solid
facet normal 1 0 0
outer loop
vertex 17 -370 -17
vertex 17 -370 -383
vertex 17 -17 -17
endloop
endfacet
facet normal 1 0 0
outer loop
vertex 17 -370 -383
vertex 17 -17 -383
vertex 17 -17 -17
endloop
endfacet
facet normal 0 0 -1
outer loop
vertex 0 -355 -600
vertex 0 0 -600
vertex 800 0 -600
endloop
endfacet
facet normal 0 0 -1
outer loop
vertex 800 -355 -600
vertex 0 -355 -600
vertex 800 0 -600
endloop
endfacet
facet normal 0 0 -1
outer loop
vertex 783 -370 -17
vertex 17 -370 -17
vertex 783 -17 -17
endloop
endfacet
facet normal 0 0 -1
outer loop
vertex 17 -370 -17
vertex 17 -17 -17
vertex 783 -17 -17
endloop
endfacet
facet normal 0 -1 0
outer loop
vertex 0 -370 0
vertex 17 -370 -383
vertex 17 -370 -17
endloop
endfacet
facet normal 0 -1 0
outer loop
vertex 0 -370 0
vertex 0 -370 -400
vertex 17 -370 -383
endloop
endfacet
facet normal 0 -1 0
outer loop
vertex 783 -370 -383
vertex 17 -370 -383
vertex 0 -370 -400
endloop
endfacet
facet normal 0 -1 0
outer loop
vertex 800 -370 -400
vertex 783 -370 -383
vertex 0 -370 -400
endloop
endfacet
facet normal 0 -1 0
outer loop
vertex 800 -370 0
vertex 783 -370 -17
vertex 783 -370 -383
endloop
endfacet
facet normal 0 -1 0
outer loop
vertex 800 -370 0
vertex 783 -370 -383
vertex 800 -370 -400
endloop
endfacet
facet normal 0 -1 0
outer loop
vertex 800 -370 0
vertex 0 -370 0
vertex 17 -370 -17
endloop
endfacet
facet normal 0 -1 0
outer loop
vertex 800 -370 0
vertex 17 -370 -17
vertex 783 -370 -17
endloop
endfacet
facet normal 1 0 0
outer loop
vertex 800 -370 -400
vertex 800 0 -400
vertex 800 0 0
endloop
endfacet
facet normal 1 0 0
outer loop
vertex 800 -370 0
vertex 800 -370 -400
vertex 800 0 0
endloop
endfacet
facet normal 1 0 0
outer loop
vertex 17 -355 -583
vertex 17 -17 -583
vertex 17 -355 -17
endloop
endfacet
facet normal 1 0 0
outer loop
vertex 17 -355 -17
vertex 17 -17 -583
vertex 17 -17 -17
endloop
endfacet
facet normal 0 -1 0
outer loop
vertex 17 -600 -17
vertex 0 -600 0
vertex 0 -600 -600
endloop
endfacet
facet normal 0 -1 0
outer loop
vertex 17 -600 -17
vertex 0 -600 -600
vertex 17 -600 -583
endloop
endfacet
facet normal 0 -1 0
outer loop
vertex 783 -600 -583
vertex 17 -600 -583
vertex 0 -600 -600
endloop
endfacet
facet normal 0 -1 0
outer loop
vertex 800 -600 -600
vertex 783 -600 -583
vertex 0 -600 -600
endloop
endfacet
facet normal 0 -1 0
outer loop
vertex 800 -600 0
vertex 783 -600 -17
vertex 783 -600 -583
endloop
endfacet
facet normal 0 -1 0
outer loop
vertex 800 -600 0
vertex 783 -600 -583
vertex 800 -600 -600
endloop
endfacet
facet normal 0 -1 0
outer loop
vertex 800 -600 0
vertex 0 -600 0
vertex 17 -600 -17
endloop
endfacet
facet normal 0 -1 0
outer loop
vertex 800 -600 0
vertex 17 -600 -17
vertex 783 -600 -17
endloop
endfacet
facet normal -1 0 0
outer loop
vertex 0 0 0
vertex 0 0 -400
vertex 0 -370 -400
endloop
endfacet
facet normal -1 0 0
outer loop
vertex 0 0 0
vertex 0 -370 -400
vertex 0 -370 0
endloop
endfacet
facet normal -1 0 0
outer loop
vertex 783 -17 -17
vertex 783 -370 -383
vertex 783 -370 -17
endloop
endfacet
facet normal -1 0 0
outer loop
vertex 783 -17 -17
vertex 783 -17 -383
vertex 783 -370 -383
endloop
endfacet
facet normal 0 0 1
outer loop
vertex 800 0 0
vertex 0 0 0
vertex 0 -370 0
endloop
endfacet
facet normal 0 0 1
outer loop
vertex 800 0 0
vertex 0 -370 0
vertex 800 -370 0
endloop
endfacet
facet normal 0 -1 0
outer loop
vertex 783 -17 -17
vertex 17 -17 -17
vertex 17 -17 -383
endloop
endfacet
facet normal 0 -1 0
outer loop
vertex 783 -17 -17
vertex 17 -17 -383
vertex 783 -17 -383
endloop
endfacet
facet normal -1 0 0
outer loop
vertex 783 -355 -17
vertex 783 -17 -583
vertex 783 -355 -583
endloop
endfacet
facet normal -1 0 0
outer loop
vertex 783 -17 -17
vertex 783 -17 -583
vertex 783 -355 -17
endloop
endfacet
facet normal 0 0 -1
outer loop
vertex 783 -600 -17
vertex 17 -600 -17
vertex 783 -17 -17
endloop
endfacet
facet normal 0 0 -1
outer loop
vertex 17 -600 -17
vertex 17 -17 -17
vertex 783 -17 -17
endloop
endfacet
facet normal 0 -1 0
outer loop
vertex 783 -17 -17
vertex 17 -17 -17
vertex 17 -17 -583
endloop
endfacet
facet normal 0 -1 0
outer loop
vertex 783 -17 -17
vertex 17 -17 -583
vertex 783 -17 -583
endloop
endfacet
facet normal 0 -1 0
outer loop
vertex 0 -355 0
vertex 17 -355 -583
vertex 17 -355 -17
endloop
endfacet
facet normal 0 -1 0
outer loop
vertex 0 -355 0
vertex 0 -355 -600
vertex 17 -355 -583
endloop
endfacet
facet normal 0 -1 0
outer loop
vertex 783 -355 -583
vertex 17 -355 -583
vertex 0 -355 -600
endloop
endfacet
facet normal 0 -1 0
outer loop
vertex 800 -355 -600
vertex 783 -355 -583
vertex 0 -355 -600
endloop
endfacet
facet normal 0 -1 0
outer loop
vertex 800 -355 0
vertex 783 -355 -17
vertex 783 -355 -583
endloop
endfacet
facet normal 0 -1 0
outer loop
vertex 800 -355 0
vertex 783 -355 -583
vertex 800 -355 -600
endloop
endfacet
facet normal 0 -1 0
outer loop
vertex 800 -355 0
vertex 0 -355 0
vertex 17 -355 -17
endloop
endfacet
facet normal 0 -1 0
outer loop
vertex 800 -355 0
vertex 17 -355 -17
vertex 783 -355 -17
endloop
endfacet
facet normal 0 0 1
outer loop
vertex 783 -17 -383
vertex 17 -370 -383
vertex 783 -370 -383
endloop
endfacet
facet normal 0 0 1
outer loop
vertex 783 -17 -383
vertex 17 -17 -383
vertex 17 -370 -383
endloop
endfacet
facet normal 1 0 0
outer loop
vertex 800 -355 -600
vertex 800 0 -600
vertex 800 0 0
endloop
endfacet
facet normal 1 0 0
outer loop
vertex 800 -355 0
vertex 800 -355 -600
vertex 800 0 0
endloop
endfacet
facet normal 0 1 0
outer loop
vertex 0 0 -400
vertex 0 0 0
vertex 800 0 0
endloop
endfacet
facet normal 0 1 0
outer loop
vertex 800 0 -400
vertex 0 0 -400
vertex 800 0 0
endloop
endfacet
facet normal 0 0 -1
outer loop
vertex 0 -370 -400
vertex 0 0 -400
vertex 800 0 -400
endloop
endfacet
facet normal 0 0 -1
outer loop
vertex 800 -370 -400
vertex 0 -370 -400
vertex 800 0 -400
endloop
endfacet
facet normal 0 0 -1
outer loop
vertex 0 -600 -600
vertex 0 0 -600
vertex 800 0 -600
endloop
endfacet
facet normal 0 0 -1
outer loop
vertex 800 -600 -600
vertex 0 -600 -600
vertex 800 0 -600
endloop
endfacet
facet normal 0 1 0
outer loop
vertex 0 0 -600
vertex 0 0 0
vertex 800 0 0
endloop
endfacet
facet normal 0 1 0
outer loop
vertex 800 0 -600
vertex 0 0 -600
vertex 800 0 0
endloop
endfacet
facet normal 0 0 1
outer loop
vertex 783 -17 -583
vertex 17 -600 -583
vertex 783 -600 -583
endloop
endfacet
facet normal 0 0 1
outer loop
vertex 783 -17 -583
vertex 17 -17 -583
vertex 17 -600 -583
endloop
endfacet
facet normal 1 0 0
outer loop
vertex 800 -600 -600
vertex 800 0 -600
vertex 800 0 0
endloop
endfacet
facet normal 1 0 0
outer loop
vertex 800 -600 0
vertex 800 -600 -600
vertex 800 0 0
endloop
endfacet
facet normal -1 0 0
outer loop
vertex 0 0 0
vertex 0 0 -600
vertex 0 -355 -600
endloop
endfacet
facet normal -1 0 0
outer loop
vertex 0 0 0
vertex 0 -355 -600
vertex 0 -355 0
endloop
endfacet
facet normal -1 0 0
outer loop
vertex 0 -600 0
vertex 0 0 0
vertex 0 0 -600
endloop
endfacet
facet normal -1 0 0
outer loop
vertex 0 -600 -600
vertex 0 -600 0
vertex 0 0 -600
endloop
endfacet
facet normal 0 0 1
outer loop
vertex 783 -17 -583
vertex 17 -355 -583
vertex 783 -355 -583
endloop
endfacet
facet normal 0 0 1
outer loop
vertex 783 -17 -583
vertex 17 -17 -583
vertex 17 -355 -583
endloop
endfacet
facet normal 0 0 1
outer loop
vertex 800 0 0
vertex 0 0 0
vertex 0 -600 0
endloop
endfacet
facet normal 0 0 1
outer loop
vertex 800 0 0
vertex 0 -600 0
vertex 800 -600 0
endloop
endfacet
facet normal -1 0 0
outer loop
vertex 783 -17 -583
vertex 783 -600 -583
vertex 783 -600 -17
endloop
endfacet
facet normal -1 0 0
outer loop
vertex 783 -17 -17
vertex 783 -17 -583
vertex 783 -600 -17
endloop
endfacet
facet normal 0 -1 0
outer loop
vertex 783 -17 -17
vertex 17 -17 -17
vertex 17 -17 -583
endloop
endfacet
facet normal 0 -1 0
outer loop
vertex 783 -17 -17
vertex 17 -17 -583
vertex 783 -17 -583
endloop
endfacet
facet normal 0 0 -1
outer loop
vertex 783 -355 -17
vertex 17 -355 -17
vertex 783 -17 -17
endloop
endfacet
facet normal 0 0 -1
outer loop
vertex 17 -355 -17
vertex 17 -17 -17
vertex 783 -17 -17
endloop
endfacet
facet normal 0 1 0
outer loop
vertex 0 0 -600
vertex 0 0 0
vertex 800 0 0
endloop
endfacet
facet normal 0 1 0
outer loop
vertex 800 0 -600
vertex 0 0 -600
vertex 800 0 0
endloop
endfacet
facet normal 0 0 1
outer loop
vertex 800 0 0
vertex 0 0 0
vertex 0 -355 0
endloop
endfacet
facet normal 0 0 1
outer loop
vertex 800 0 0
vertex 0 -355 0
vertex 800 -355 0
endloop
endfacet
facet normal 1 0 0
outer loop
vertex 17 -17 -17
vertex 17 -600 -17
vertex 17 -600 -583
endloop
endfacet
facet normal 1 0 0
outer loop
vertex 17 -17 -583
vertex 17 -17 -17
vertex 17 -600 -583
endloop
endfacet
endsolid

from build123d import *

# Parameters (mm, degrees)
F0_W     = 800
F0_H     = 600
F1_DEPTH = 355
F2_T     = -17
F3_W     = 800
F3_H     = 400
F4_DEPTH = 370
F5_T     = -17
F3_H_2   = 200
F6_DEPTH = 600
F7_T     = -17


with BuildPart() as f1:
    # F0 (on Front) → F1 (new body)
    with BuildSketch(Plane.XZ):
        with Locations((400, -300)):
            Rectangle(F0_W, F0_H)
    extrude(amount=F1_DEPTH)

    # F2
    f2_openings = [f1.faces().sort_by_distance(p)[0] for p in [
        (400, -355, -300),
    ]]
    offset(amount=F2_T, openings=f2_openings)


with BuildPart() as f4:
    # F3 (on Front) → F4 (new body)
    with BuildSketch(Plane.XZ):
        with Locations((400, -200)):
            Rectangle(F3_W, F3_H)
    extrude(amount=F4_DEPTH)

    # F5
    f5_openings = [f4.faces().sort_by_distance(p)[0] for p in [
        (400, -370, -200),
    ]]
    offset(amount=F5_T, openings=f5_openings)


with BuildPart() as f6:
    # F3 (on Front) → F6 (new body)
    with BuildSketch(Plane.XZ):
        with Locations((400, -200)):
            Rectangle(F3_W, F3_H)
        with Locations((400, -500)):
            Rectangle(F3_W, F3_H_2)
    extrude(amount=F6_DEPTH)

    # F7
    f7_openings = [f6.faces().sort_by_distance(p)[0] for p in [
        (400, -600, -300),
    ]]
    offset(amount=F7_T, openings=f7_openings)


solid = Compound([f1.part, f4.part, f6.part])
